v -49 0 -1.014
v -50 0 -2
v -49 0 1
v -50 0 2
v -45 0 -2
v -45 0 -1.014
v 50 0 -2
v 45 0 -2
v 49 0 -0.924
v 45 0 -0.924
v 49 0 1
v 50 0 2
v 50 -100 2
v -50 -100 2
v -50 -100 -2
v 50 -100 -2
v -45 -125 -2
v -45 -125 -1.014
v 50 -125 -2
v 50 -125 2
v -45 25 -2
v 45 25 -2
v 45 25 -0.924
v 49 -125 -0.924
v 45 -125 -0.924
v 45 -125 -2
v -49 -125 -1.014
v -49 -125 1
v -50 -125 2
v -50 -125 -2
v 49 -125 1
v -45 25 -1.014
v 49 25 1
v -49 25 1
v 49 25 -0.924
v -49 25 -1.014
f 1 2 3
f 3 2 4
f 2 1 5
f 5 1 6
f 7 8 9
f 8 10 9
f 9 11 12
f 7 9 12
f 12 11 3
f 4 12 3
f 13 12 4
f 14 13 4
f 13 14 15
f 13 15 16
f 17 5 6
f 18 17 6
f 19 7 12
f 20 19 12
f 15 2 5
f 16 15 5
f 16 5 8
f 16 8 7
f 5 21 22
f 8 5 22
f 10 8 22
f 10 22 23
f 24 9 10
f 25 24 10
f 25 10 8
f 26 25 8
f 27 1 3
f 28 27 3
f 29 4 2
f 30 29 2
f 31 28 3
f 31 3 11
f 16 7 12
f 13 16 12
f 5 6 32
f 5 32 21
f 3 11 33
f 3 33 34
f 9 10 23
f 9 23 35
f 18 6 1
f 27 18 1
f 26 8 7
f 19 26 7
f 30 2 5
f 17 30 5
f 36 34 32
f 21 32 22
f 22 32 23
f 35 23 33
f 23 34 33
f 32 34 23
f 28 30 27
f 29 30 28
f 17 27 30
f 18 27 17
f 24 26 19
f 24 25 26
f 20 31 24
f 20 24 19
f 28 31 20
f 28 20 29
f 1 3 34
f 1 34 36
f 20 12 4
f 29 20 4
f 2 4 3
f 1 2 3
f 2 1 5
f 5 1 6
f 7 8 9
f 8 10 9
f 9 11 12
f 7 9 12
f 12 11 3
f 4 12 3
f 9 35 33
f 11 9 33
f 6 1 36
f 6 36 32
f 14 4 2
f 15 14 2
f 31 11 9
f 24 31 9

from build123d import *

# Parameters (mm, degrees)
F1_DEPTH = 100
F2_DEPTH = 25
F3_DEPTH = 125


with BuildPart() as f1:
    # F0 (on Front) → F1 (new body)
    with BuildSketch(Plane.XZ):
        Polygon((-45, -2), (45, -2), (45, -0.92414), (49, -0.92414), (49, 1), (-49, 1), (-49, -1.014037), (-45, -1.014037), align=None)
        Polygon((45, -2), (50, -2), (50, 2), (-50, 2), (-50, -2), (-45, -2), (-45, -1.014037), (-49, -1.014037), (-49, 1), (49, 1), (49, -0.92414), (45, -0.92414), align=None)
    extrude(amount=F1_DEPTH)

    # F0 (on Front) → F2 (join)
    with BuildSketch(Plane.XZ):
        Polygon((-45, -2), (45, -2), (45, -0.92414), (49, -0.92414), (49, 1), (-49, 1), (-49, -1.014037), (-45, -1.014037), align=None)
    extrude(amount=-F2_DEPTH)


with BuildPart() as f3:
    # F0 (on Front) → F3 (new body)
    with BuildSketch(Plane.XZ):
        Polygon((45, -2), (50, -2), (50, 2), (-50, 2), (-50, -2), (-45, -2), (-45, -1.014037), (-49, -1.014037), (-49, 1), (49, 1), (49, -0.92414), (45, -0.92414), align=None)
    extrude(amount=F3_DEPTH)


solid = Compound([f1.part, f3.part])
